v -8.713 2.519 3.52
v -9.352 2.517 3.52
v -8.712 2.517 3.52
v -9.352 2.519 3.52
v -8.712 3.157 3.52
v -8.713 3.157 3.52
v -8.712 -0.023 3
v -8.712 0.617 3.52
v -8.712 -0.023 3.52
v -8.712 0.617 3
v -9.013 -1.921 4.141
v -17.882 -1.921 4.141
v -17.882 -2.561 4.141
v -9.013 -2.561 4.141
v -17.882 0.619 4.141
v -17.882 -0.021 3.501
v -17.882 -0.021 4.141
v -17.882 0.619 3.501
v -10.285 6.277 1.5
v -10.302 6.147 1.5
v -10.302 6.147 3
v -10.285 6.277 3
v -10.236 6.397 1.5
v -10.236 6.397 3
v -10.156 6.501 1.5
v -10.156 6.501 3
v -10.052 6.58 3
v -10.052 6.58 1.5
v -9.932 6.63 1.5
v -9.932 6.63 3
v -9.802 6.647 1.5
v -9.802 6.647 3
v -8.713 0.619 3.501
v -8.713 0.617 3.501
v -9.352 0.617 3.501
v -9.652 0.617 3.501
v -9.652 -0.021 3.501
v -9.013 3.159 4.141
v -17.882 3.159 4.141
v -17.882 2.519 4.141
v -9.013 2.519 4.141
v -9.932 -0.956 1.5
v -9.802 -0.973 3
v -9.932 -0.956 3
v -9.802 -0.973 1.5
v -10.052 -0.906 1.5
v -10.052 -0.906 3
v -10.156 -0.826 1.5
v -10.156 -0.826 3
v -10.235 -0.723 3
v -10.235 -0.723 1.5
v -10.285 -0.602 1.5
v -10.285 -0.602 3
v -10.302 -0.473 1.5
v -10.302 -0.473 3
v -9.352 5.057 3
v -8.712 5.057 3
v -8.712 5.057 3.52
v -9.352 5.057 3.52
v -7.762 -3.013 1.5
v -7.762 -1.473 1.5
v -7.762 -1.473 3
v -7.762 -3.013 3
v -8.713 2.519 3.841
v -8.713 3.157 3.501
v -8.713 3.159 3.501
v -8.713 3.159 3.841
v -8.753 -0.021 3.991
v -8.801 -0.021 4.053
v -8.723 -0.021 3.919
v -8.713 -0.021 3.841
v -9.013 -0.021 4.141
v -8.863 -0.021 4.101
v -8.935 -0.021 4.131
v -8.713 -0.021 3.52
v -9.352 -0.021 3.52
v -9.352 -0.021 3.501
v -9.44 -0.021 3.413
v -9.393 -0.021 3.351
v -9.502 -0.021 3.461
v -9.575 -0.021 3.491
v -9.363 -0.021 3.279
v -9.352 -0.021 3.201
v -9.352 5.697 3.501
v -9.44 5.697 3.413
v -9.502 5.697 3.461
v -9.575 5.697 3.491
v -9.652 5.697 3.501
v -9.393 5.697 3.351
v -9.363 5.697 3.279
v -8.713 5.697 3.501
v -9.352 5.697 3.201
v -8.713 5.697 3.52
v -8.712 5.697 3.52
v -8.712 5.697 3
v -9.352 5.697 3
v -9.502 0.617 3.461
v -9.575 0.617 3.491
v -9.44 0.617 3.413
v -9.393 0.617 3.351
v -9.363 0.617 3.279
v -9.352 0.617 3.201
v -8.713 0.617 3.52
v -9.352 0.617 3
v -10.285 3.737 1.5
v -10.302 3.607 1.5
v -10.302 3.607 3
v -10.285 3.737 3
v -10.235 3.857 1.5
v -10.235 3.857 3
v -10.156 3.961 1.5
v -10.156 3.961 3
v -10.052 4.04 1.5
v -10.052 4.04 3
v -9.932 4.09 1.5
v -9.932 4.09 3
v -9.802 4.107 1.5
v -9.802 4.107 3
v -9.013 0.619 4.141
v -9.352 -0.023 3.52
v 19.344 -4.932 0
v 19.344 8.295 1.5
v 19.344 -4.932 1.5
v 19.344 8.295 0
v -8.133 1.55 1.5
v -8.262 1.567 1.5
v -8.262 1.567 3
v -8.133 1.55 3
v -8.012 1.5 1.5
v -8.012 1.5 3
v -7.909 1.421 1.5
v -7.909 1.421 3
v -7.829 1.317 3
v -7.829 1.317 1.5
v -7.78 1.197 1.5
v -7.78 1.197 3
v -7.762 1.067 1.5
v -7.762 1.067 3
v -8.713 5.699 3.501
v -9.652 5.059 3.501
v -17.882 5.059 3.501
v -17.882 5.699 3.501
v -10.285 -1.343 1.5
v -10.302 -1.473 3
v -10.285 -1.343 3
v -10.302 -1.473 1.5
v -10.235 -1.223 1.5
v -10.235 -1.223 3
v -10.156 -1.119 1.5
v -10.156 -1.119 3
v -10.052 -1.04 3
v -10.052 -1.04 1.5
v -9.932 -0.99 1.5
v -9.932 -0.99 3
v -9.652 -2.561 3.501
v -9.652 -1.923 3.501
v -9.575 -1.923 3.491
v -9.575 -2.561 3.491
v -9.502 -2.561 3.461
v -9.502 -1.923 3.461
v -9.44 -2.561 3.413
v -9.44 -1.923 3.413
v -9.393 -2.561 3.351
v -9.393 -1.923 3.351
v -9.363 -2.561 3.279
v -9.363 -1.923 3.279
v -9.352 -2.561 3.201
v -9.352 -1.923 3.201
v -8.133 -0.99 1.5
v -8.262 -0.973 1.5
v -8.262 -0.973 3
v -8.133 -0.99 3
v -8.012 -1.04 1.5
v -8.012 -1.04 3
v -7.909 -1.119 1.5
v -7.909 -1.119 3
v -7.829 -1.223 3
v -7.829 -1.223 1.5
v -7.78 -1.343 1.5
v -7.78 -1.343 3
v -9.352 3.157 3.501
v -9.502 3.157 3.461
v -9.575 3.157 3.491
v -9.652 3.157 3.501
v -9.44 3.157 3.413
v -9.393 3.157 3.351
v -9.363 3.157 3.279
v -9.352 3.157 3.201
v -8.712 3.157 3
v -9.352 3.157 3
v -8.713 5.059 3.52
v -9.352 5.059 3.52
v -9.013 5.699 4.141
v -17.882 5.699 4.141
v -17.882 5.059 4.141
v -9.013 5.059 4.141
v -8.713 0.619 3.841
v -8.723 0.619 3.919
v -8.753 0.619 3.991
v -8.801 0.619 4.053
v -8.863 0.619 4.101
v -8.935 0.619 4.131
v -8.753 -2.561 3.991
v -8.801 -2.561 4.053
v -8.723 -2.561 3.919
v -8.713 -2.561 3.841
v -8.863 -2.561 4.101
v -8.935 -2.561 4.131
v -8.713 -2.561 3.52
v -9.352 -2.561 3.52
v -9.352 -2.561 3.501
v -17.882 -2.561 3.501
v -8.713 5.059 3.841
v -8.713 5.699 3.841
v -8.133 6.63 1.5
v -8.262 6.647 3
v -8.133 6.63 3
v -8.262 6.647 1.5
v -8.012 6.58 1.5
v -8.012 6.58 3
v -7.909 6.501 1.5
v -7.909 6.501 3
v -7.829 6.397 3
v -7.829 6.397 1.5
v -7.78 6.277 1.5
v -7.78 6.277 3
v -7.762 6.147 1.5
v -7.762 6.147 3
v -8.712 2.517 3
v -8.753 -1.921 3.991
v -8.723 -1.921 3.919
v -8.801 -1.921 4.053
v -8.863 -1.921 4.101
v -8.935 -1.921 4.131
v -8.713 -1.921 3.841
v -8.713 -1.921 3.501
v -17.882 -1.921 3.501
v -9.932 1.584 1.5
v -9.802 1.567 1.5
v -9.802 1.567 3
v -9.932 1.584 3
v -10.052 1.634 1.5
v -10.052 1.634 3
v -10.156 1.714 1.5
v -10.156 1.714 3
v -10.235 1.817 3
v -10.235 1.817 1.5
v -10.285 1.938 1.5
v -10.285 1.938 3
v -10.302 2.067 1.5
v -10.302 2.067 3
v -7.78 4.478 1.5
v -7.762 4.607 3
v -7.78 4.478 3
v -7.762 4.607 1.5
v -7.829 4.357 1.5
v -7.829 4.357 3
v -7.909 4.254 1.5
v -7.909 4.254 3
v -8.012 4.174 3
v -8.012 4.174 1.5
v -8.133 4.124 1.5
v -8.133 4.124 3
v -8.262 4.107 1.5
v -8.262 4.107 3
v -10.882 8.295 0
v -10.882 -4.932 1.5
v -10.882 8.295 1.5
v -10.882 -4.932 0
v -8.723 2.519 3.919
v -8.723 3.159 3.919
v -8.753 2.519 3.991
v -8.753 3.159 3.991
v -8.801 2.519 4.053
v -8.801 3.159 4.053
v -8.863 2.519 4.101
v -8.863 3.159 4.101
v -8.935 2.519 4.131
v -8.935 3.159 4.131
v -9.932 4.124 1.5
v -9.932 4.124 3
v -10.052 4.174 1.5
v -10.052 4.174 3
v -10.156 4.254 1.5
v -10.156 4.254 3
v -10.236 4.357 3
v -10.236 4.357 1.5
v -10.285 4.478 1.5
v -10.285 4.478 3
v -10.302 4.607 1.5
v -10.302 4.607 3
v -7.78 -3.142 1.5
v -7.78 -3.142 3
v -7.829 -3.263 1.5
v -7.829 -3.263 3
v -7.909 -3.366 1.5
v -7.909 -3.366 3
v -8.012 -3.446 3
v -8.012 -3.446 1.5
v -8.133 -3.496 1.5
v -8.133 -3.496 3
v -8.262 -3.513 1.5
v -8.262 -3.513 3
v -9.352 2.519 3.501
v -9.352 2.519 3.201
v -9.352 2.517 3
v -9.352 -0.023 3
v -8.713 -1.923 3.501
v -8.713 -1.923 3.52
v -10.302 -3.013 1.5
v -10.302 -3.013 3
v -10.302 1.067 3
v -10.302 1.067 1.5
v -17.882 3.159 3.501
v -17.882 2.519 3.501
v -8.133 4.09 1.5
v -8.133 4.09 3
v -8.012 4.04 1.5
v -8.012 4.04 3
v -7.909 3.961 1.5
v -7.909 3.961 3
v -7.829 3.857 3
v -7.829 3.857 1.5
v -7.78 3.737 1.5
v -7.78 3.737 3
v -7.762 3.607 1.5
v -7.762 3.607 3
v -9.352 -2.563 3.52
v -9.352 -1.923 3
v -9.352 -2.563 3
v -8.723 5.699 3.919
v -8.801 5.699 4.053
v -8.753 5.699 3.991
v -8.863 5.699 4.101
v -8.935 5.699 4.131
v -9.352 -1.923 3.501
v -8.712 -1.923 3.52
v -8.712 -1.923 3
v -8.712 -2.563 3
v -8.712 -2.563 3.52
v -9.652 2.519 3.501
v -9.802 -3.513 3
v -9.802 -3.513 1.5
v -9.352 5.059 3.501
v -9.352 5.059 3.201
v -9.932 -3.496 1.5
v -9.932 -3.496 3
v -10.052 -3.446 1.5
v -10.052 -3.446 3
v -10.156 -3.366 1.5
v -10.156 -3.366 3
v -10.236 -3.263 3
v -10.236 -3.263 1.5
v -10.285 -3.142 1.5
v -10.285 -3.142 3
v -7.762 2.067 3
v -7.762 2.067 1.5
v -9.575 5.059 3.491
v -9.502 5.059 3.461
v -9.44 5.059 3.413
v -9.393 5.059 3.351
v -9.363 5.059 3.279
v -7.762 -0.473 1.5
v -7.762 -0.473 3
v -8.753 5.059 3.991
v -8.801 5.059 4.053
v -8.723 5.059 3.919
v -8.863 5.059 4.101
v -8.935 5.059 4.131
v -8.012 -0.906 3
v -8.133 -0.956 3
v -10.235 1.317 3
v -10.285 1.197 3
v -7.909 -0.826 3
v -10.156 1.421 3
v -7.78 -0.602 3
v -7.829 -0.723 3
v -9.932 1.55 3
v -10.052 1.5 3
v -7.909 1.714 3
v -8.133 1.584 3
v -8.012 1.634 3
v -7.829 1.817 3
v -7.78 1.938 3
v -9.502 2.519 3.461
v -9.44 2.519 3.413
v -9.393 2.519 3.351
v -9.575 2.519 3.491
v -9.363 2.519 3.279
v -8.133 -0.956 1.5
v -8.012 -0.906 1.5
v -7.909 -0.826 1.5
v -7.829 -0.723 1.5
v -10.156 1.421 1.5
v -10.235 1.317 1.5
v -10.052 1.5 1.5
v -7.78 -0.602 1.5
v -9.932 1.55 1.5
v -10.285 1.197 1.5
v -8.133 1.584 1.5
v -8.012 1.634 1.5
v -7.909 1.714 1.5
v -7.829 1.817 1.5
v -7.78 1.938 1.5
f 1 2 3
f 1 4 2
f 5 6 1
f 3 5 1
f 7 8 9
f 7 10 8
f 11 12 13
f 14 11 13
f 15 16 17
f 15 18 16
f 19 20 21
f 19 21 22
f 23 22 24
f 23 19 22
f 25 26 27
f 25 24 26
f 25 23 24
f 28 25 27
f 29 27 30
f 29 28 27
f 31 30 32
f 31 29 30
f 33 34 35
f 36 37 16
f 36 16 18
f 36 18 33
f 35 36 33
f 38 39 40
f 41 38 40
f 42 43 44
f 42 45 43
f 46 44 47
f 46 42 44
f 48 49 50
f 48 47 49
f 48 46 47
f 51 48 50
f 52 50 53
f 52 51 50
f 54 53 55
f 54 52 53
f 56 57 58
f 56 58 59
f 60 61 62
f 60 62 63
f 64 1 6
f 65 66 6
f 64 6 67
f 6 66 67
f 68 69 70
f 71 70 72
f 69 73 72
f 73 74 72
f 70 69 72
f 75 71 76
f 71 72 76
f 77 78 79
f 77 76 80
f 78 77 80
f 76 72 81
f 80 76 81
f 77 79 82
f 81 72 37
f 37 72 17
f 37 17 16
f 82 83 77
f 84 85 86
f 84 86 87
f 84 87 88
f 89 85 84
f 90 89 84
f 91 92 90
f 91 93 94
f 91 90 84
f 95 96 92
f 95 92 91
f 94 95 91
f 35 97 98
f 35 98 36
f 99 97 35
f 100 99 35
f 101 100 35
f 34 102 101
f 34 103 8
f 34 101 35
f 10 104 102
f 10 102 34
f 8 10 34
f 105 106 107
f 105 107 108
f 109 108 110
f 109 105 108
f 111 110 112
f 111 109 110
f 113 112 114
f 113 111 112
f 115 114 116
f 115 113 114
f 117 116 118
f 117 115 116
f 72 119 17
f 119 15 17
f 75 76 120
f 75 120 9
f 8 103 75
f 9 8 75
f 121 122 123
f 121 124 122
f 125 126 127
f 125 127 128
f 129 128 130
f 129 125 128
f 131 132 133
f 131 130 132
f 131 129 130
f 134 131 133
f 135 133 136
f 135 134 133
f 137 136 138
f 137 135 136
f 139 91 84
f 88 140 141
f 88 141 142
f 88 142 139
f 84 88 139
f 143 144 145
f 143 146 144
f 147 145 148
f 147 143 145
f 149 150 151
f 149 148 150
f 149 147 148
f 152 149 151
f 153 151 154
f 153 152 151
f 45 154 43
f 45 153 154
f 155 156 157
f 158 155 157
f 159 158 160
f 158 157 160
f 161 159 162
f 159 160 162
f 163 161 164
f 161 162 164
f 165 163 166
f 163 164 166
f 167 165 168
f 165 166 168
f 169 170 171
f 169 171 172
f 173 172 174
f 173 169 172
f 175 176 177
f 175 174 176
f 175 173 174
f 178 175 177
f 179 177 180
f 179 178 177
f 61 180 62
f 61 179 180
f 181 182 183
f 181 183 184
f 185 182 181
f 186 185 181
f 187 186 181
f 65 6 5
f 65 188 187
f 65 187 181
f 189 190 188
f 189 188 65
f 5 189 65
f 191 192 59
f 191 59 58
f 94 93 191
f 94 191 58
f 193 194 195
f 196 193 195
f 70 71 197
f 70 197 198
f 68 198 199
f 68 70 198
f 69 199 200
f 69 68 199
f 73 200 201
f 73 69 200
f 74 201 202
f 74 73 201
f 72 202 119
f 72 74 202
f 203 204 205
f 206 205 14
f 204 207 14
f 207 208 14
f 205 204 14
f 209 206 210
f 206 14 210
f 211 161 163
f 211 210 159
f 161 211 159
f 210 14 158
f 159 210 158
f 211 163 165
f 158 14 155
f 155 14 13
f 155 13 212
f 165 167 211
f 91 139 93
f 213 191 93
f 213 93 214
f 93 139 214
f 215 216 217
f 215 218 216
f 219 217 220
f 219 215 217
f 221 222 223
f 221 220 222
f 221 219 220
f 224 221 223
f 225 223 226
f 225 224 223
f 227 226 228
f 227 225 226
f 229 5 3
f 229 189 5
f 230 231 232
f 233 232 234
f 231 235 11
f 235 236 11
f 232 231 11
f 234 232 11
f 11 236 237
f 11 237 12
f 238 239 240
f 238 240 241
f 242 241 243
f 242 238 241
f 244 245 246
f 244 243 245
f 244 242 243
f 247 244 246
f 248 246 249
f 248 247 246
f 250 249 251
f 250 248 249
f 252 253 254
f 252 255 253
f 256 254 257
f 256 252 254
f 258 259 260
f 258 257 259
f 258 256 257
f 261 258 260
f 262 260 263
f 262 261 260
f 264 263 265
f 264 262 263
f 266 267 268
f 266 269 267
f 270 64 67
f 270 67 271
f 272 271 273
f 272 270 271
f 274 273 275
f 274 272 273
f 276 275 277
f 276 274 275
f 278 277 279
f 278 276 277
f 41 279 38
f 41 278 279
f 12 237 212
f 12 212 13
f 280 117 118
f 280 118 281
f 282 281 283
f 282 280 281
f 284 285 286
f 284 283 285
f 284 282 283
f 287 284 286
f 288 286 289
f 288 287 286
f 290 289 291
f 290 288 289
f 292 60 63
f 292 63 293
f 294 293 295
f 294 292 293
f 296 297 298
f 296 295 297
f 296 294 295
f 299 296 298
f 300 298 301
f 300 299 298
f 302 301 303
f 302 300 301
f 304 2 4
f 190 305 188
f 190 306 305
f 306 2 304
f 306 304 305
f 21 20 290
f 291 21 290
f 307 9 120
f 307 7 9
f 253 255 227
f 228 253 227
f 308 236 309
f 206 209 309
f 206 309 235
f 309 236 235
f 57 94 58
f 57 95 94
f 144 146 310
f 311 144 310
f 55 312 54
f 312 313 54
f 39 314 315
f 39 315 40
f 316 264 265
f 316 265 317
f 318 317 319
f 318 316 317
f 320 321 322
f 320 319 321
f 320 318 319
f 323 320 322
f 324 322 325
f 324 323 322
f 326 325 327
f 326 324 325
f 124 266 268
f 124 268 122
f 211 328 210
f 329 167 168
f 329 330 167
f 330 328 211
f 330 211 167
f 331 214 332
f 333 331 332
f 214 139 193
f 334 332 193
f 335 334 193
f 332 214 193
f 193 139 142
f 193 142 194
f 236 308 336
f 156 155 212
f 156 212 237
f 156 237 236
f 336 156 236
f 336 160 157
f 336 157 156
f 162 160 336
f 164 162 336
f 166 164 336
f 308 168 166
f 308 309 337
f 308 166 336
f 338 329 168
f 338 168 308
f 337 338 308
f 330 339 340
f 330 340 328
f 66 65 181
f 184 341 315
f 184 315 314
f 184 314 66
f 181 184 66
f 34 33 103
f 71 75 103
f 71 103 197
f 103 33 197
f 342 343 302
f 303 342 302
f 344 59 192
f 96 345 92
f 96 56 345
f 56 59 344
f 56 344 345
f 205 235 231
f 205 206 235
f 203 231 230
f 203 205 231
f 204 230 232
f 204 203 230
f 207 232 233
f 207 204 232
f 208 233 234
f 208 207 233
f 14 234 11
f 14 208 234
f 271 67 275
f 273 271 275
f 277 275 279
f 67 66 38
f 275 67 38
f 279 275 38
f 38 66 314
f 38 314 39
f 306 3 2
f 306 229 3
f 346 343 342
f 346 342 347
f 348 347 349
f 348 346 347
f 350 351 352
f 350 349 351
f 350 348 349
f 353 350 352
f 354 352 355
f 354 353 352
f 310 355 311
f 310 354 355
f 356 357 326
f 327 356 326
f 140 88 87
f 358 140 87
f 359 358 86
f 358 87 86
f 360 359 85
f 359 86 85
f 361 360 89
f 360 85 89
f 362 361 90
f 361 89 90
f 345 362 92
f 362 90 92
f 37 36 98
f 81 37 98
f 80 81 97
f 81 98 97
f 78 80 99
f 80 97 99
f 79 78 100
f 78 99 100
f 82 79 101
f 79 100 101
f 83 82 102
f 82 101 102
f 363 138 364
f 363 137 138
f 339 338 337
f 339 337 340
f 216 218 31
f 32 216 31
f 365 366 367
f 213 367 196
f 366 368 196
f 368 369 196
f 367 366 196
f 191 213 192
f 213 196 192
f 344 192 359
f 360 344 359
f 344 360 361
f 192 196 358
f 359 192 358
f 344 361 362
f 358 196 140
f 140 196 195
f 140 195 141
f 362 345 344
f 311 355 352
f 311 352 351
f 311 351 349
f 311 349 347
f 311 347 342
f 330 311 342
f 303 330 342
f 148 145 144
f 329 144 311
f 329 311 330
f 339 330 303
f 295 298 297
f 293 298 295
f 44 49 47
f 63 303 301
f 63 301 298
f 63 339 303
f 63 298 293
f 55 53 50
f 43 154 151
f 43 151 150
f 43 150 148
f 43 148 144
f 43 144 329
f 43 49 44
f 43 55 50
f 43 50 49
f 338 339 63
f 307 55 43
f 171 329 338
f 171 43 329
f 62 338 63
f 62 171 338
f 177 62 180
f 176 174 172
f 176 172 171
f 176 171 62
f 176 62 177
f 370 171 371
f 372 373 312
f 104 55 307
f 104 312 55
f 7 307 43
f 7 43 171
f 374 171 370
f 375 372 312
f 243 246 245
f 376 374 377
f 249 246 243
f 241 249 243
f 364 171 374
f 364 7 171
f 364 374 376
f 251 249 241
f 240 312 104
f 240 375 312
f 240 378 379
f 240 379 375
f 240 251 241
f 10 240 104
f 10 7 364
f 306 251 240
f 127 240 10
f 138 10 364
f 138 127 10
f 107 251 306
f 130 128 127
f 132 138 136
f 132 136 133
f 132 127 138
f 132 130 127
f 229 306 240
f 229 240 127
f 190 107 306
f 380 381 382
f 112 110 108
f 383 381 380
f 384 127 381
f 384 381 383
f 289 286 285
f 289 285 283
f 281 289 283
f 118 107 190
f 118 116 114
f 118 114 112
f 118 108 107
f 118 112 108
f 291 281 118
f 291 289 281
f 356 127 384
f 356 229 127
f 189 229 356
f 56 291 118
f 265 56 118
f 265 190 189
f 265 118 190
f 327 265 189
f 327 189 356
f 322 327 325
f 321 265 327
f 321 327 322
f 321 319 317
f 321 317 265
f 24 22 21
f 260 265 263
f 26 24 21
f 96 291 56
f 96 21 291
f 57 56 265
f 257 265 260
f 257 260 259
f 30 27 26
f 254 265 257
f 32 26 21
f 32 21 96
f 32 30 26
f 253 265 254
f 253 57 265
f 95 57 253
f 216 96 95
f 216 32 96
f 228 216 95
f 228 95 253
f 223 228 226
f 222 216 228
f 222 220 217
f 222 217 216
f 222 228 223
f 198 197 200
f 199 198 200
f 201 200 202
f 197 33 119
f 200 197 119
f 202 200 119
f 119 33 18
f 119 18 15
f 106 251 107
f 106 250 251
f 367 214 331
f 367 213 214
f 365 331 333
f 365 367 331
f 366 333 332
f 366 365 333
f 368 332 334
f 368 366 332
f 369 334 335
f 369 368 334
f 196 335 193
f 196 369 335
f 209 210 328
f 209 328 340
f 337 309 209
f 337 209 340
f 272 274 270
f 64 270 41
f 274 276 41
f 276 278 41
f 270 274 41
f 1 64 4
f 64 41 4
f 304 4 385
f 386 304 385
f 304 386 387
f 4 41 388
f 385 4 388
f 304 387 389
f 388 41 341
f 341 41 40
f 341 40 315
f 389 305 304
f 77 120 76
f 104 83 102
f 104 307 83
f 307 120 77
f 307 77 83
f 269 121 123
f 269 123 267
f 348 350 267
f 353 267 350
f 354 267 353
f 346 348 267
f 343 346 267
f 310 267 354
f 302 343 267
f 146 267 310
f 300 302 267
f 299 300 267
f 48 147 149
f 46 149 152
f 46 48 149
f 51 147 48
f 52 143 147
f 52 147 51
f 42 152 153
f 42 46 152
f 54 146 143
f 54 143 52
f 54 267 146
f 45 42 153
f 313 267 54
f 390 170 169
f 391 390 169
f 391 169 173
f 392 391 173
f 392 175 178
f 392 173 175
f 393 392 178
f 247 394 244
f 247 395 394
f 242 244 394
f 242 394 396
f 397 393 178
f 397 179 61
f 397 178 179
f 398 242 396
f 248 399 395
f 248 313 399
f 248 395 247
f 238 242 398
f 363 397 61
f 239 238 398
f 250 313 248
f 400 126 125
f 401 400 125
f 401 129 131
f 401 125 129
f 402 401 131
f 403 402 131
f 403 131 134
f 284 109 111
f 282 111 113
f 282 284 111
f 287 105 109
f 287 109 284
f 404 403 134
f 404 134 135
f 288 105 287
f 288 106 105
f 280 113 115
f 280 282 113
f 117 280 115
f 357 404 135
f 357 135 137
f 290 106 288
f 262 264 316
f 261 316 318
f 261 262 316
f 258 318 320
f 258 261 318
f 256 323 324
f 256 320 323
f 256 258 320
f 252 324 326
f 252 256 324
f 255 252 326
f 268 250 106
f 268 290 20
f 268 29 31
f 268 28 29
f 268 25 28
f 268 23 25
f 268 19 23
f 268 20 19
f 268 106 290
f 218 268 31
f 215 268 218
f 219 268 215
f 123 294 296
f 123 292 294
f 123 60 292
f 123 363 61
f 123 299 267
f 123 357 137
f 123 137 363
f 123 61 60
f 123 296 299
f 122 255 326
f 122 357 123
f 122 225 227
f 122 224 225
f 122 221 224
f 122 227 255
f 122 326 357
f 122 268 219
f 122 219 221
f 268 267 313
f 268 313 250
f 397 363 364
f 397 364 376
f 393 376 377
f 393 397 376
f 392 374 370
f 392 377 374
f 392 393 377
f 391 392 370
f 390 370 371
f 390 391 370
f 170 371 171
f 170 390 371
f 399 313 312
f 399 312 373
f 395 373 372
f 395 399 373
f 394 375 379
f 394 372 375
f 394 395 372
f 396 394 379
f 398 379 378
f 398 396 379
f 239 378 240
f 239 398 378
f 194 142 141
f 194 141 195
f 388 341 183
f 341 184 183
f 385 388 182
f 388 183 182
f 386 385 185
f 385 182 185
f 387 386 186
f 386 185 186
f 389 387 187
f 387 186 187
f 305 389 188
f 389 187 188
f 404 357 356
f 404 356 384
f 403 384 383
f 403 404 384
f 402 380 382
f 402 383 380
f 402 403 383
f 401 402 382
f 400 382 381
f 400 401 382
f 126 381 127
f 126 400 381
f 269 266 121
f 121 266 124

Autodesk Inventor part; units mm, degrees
ref_plane "YZ Plane" through (0, 0, 0) normal (1, 0, 0) x (0, 1, 0)
sketch "Sketch1" plane through (0, 0, 0) normal (0, 0, 1) x (1, 0, 0)
  line L0 (-10.8819, 8.2952) -> (19.3441, 8.2952)
  line L1 (19.3441, 8.2952) -> (19.3441, -4.9318)
  line L2 (19.3441, -4.9318) -> (-10.8819, -4.9318)
  line L3 (-10.8819, -4.9318) -> (-10.8819, 8.2952)
  point P0 (0, 0)
  dimension "d0" = 30.226
  dimension "d1" = 13.227
extrude "Extrusion1" add sketch "Sketch1" along normal blind 1.5
sketch "Sketch2" plane through (0, 0, 1.5) normal (0, 0, 1) x (1, 0, 0)
  line L0 (-7.7625, -1.4726) -> (-7.7625, -3.0126)
  line L1 (-9.8024, 1.5674) -> (-8.2625, 1.5674)
  line L2 (-8.7125, 2.5174) -> (-9.3525, 2.5174)
  line L3 (-9.3525, 3.1574) -> (-8.7125, 3.1574)
  line L4 (-9.3525, 2.5174) -> (-9.3525, 3.1574)
  line L5 (-8.7125, 3.1574) -> (-8.7125, 2.5174)
  line L6 (-9.3525, 2.5174) -> (-8.7125, 3.1574) construction
  line L7 (-9.3525, 3.1574) -> (-8.7125, 2.5174) construction
  line L8 (-9.3524, 5.0573) -> (-9.3524, 5.6973)
  line L9 (-9.3524, 5.0573) -> (-8.7124, 5.6973) construction
  line L10 (-8.2625, 6.6474) -> (-9.8025, 6.6474)
  line L11 (-8.7124, 5.0573) -> (-9.3524, 5.0573)
  line L12 (-9.3524, 5.6973) -> (-8.7124, 5.6973)
  line L13 (-8.7124, 5.6973) -> (-8.7124, 5.0573)
  line L14 (-9.3524, 5.6973) -> (-8.7124, 5.0573) construction
  line L15 (-9.8025, 4.1074) -> (-8.2625, 4.1074)
  line L16 (-9.8025, -3.5126) -> (-8.2625, -3.5126)
  line L17 (-9.8024, -0.9726) -> (-8.2625, -0.9726)
  line L18 (-9.3524, -1.9227) -> (-8.7124, -1.9227)
  line L19 (-8.7124, -1.9227) -> (-8.7124, -2.5627)
  line L20 (-8.7124, -2.5627) -> (-9.3524, -2.5627)
  line L21 (-9.3524, -2.5627) -> (-9.3524, -1.9227)
  line L22 (-9.3525, 0.6174) -> (-8.7125, 0.6174)
  line L23 (-8.7125, 0.6174) -> (-8.7125, -0.0226)
  line L24 (-8.7125, -0.0226) -> (-9.3525, -0.0226)
  line L25 (-9.3525, -0.0226) -> (-9.3525, 0.6174)
  line L26 (-9.3525, 0.6174) -> (-8.7125, -0.0226) construction
  line L27 (-9.3524, -1.9227) -> (-8.7124, -2.5627) construction
  line L28 (-9.3524, -2.5627) -> (-8.7124, -1.9227) construction
  line L29 (-9.3525, -0.0226) -> (-8.7125, 0.6174) construction
  line L30 (-10.3025, 6.1474) -> (-10.3025, 4.6074)
  line L31 (-7.7625, 4.6074) -> (-7.7625, 6.1474)
  arc A0 (-7.7625, 6.1474) -> (-8.2625, 6.6474) centre (-8.2625, 6.1474) ccw
  arc A1 (-9.8025, 6.6474) -> (-10.3025, 6.1474) centre (-9.8025, 6.1474) ccw
  arc A2 (-8.2625, -3.5126) -> (-7.7625, -3.0126) centre (-8.2625, -3.0126) ccw
  arc A3 (-10.3025, -3.0126) -> (-9.8025, -3.5126) centre (-9.8025, -3.0126) ccw
  arc A4 (-8.2625, 4.1074) -> (-7.7625, 4.6074) centre (-8.2625, 4.6074) ccw
  arc A5 (-10.3025, 4.6074) -> (-9.8025, 4.1074) centre (-9.8025, 4.6074) ccw
  arc A6 (-7.7625, -1.4726) -> (-8.2625, -0.9726) centre (-8.2625, -1.4726) ccw
  line L32 (-10.3024, 2.0674) -> (-10.3023, 3.6074)
  line L33 (-9.8023, 4.1074) -> (-9.8025, 4.1074)
  arc A7 (-9.8023, 4.1074) -> (-10.3023, 3.6074) centre (-9.8023, 3.6074) ccw
  arc A8 (-10.3024, 2.0674) -> (-9.8024, 1.5674) centre (-9.8024, 2.0674) ccw
  line L34 (-9.8024, 1.5674) -> (-9.8024, 1.5674)
  line L35 (-10.3024, 1.0674) -> (-10.3024, -0.4726)
  line L36 (-7.7625, 2.0674) -> (-7.7625, 3.6074)
  line L37 (-8.2625, 4.1074) -> (-8.2625, 4.1074)
  arc A9 (-7.7625, 3.6074) -> (-8.2625, 4.1074) centre (-8.2625, 3.6074) ccw
  arc A10 (-8.2625, 1.5674) -> (-7.7625, 2.0674) centre (-8.2625, 2.0674) ccw
  arc A11 (-9.8024, 1.5674) -> (-10.3024, 1.0674) centre (-9.8024, 1.0674) ccw
  arc A12 (-10.3024, -0.4726) -> (-9.8024, -0.9726) centre (-9.8024, -0.4726) ccw
  line L38 (-8.2625, 1.5674) -> (-8.2625, 1.5674)
  line L39 (-7.7625, 1.0674) -> (-7.7625, -0.4726)
  line L40 (-8.2625, -0.9726) -> (-8.2625, -0.9726)
  line L41 (-9.8024, -0.9726) -> (-9.8024, -0.9726)
  line L42 (-10.3024, -1.4726) -> (-10.3024, -3.0237)
  arc A13 (-9.8024, -0.9726) -> (-10.3024, -1.4726) centre (-9.8024, -1.4726) ccw
  arc A14 (-8.2625, -0.9726) -> (-7.7625, -0.4726) centre (-8.2625, -0.4726) ccw
  arc A15 (-7.7625, 1.0674) -> (-8.2625, 1.5674) centre (-8.2625, 1.0674) ccw
  line L43 (-8.2625, -0.9726) -> (-9.8024, -0.9726)
  line L44 (-8.2625, 1.5674) -> (-9.8024, 1.5674)
  line L45 (-8.2625, 4.1074) -> (-9.8024, 4.1074)
  line L46 (-9.8024, -0.9726) -> (-8.2625, -0.9726)
  line L47 (-8.2625, -0.9726) -> (-9.8024, -0.9726)
  line L48 (-7.7625, -1.4726) -> (-7.7625, -3.0126)
  line L49 (-8.2625, -3.5126) -> (-9.8025, -3.5126)
  line L50 (-10.3024, -3.0237) -> (-10.3024, -1.4726)
  point P0 (-7.7625, 6.6911)
  dimension "d30" = 0.64
  dimension "d31" = 0.64
  dimension "d32" = 0.64
  dimension "d33" = 0.64
  dimension "d34" = 0.64
  dimension "d35" = 0.64
  dimension "d36" = 0.64
  dimension "d37" = 0.64
  dimension "d38" = 1.9001
  dimension "d39" = 1.9
  dimension "d40" = 1.9
  dimension "d41" = 0.5
  dimension "d42" = 0.5
  dimension "d43" = 0.5
  dimension "d44" = 0.5
extrude "Extrusion2" add sketch "Sketch2" along normal blind 1.5 contours L17 A12 L35 A11 L1 A15 L39 A14 | L1 A8 L32 A7 L15 A9 L36 A10 | L15 A5 L30 A1 L10 A0 L31 A4 | L2 L4 L3 L5 | L8 L12 L13 L11 | L22 L23 L24 L25
extrude "Extrusion3" add sketch "Sketch2" along normal blind 1.5 contours L0 A2 L16 A3 L42 A13 L17 A6 | L18 L19 L20 L21
extrude "Extrusion4" add sketch "Sketch2" along normal blind 2.02 contours L2 L4 L3 L5 | L8 L12 L13 L11 | L18 L19 L20 L21 | L22 L23 L24 L25
ref_plane "Work Plane1" through (0, 0, 3.5) normal (0, 0, 1) x (1, 0, 0)
sketch "Sketch3" plane through (0, 0, 3.5) normal (0, 0, 1) x (1, 0, 0)
  line L0 (-8.7124, 5.0573) -> (-8.7124, 5.6973) projected
  line L1 (-8.7125, -0.0226) -> (-9.3525, -0.0226) projected
  line L2 (-9.3525, -0.0226) -> (-9.3525, 0.6174) projected
  line L3 (-9.3525, 0.6174) -> (-8.7125, 0.6174) projected
  line L4 (-8.7125, 0.6174) -> (-8.7125, -0.0226) projected
  line L5 (-9.3525, 3.1574) -> (-8.7125, 3.1574) projected
  line L6 (-8.7125, 3.1574) -> (-8.7125, 2.5174) projected
  line L7 (-8.7125, 2.5174) -> (-9.3525, 2.5174) projected
  line L8 (-9.3525, 2.5174) -> (-9.3525, 3.1574) projected
  line L9 (-8.7124, -1.9227) -> (-8.7124, -2.5627) projected
  line L10 (-8.7124, -2.5627) -> (-9.3524, -2.5627) projected
  line L11 (-9.3524, -2.5627) -> (-9.3524, -1.9227) projected
  line L12 (-9.3524, -1.9227) -> (-8.7124, -1.9227) projected
  line L13 (-9.3524, 5.6973) -> (-8.7124, 5.6973) projected
  line L14 (-8.7124, 5.6973) -> (-8.7124, 5.0573) projected
  line L15 (-8.7124, 5.0573) -> (-9.3524, 5.0573) projected
  line L16 (-9.3524, 5.0573) -> (-9.3524, 5.6973) projected
  arc A0 (-9.8024, 1.5674) -> (-10.3024, 1.0674) centre (-9.8024, 1.0674) ccw construction
  line L17 (-10.3024, 1.0674) -> (-10.3024, -0.4726) construction
  arc A1 (-10.3024, -0.4726) -> (-9.8024, -0.9726) centre (-9.8024, -0.4726) ccw construction
  arc A2 (-9.8024, -0.9726) -> (-10.3024, -1.4726) centre (-9.8024, -1.4726) ccw construction
  line L18 (-10.3024, -1.4726) -> (-10.3024, -3.0237) construction
  arc A3 (-10.3024, -3.0237) -> (-9.8025, -3.5126) centre (-9.8025, -3.0126) ccw construction
  line L19 (-9.8025, -3.5126) -> (-8.2625, -3.5126) construction
  arc A4 (-8.2625, -3.5126) -> (-7.7625, -3.0126) centre (-8.2625, -3.0126) ccw construction
  line L20 (-7.7625, -3.0126) -> (-7.7625, -1.4726) construction
  arc A5 (-7.7625, -1.4726) -> (-8.2625, -0.9726) centre (-8.2625, -1.4726) ccw construction
  arc A6 (-8.2625, -0.9726) -> (-7.7625, -0.4726) centre (-8.2625, -0.4726) ccw construction
  line L21 (-7.7625, -0.4726) -> (-7.7625, 1.0674) construction
  arc A7 (-7.7625, 1.0674) -> (-8.2625, 1.5674) centre (-8.2625, 1.0674) ccw construction
  arc A8 (-8.2625, 1.5674) -> (-7.7625, 2.0674) centre (-8.2625, 2.0674) ccw construction
  line L22 (-7.7625, 2.0674) -> (-7.7625, 3.6074) construction
  arc A9 (-7.7625, 3.6074) -> (-8.2625, 4.1074) centre (-8.2625, 3.6074) ccw construction
  arc A10 (-8.2625, 4.1074) -> (-7.7625, 4.6074) centre (-8.2625, 4.6074) ccw construction
  line L23 (-7.7625, 4.6074) -> (-7.7625, 6.1474) construction
  arc A11 (-7.7625, 6.1474) -> (-8.2625, 6.6474) centre (-8.2625, 6.1474) ccw construction
  line L24 (-8.2625, 6.6474) -> (-9.8025, 6.6474) construction
  arc A12 (-9.8025, 6.6474) -> (-10.3025, 6.1474) centre (-9.8025, 6.1474) ccw construction
  line L25 (-10.3025, 6.1474) -> (-10.3025, 4.6074) construction
  arc A13 (-10.3025, 4.6074) -> (-9.8024, 4.1074) centre (-9.8025, 4.6074) ccw construction
  arc A14 (-9.8024, 4.1074) -> (-10.3023, 3.6074) centre (-9.8023, 3.6074) ccw construction
  line L26 (-10.3023, 3.6074) -> (-10.3024, 2.0674) construction
  arc A15 (-10.3024, 2.0674) -> (-9.8024, 1.5674) centre (-9.8024, 2.0674) ccw construction
  line L27 (19.3441, 8.2952) -> (-10.8819, 8.2952) construction
  line L28 (-10.8819, 8.2952) -> (-10.8819, -4.9318) construction
  line L29 (-10.8819, -4.9318) -> (19.3441, -4.9318) construction
  line L30 (19.3441, -4.9318) -> (19.3441, 8.2952) construction
  arc A16 (-7.7625, -1.4726) -> (-8.2625, -0.9726) centre (-8.2625, -1.4726) ccw construction
  line L31 (-7.7625, -1.4726) -> (-7.7625, -3.0126) construction
  arc A17 (-8.2625, -3.5126) -> (-7.7625, -3.0126) centre (-8.2625, -3.0126) ccw construction
  line L32 (-8.2625, -3.5126) -> (-9.8025, -3.5126) construction
  arc A18 (-10.3024, -3.0237) -> (-9.8025, -3.5126) centre (-9.8025, -3.0126) ccw construction
  line L33 (-10.3024, -3.0237) -> (-10.3024, -1.4726) construction
  arc A19 (-9.8024, -0.9726) -> (-10.3024, -1.4726) centre (-9.8024, -1.4726) ccw construction
  arc A20 (-10.3024, -0.4726) -> (-9.8024, -0.9726) centre (-9.8024, -0.4726) ccw construction
  line L34 (-10.3024, -0.4726) -> (-10.3024, 1.0674) construction
  arc A21 (-9.8024, 1.5674) -> (-10.3024, 1.0674) centre (-9.8024, 1.0674) ccw construction
  arc A22 (-10.3024, 2.0674) -> (-9.8024, 1.5674) centre (-9.8024, 2.0674) ccw construction
  line L35 (-10.3024, 2.0674) -> (-10.3023, 3.6074) construction
  arc A23 (-9.8024, 4.1074) -> (-10.3023, 3.6074) centre (-9.8023, 3.6074) ccw construction
  arc A24 (-10.3025, 4.6074) -> (-9.8024, 4.1074) centre (-9.8025, 4.6074) ccw construction
  line L36 (-10.3025, 4.6074) -> (-10.3025, 6.1474) construction
  arc A25 (-9.8025, 6.6474) -> (-10.3025, 6.1474) centre (-9.8025, 6.1474) ccw construction
  line L37 (-9.8025, 6.6474) -> (-8.2625, 6.6474) construction
  arc A26 (-7.7625, 6.1474) -> (-8.2625, 6.6474) centre (-8.2625, 6.1474) ccw construction
  line L38 (-7.7625, 6.1474) -> (-7.7625, 4.6074) construction
  arc A27 (-8.2625, 4.1074) -> (-7.7625, 4.6074) centre (-8.2625, 4.6074) ccw construction
  arc A28 (-7.7625, 3.6074) -> (-8.2625, 4.1074) centre (-8.2625, 3.6074) ccw construction
  line L39 (-7.7625, 3.6074) -> (-7.7625, 2.0674) construction
  arc A29 (-8.2625, 1.5674) -> (-7.7625, 2.0674) centre (-8.2625, 2.0674) ccw construction
  arc A30 (-7.7625, 1.0674) -> (-8.2625, 1.5674) centre (-8.2625, 1.0674) ccw construction
  line L40 (-7.7625, 1.0674) -> (-7.7625, -0.4726) construction
  arc A31 (-8.2625, -0.9726) -> (-7.7625, -0.4726) centre (-8.2625, -0.4726) ccw construction
  point P0 (0, 0)
ref_plane "Work Plane2" through (-17.8819, -4.9318, 0) normal (-1, 0, 0) x (0, 0, 1)
sketch "Sketch4" plane through (-17.8819, -4.9318, 0) normal (-1, 0, 0) x (0, 0, 1)
  line L0 (3.5011, 3.0104) -> (4.1411, 3.0104)
  line L1 (3.5011, 3.0104) -> (4.1411, 2.3704) construction
  line L2 (4.1411, 3.0104) -> (4.1411, 2.3704)
  line L3 (4.1411, 2.3704) -> (3.5011, 2.3704)
  line L4 (3.5011, 2.3704) -> (3.5011, 3.0104)
  line L5 (3.5011, 2.3704) -> (4.1411, 3.0104) construction
  line L6 (4.1411, 7.4505) -> (3.5011, 7.4505)
  line L7 (3.5011, 8.0905) -> (4.1411, 8.0905)
  line L8 (4.1411, 8.0905) -> (4.1411, 7.4505)
  line L9 (3.5011, 7.4505) -> (4.1411, 8.0905) construction
  line L10 (3.5011, 8.0905) -> (4.1411, 7.4505) construction
  line L11 (3.5011, 7.4505) -> (3.5011, 8.0905)
  line L12 (3.5012, 9.9904) -> (3.5012, 10.6304)
  line L13 (3.5012, 9.9904) -> (4.1412, 10.6304) construction
  line L14 (4.1412, 9.9904) -> (3.5012, 9.9904)
  line L15 (4.1412, 10.6304) -> (4.1412, 9.9904)
  line L16 (3.5012, 10.6304) -> (4.1412, 9.9904) construction
  line L17 (3.5012, 10.6304) -> (4.1412, 10.6304)
  line L18 (4.1411, 4.9105) -> (3.5011, 4.9105)
  line L19 (3.5011, 5.5505) -> (4.1411, 5.5505)
  line L20 (4.1411, 5.5505) -> (4.1411, 4.9105)
  line L21 (3.5011, 4.9105) -> (3.5011, 5.5505)
  line L22 (3.5011, 5.5505) -> (4.1411, 4.9105) construction
  line L23 (3.5011, 4.9105) -> (4.1411, 5.5505) construction
  line L24 (2.4101, 9.0392) -> (2.41, 9.0392)
  line L25 (2.4101, 6.4992) -> (2.4101, 6.4992)
  line L26 (2.4101, 3.9592) -> (2.4101, 3.9592)
  point P0 (0, 4.9318)
  point P1 (2.2355, 10.9967)
  point P2 (2.2355, 1.8367)
  point P3 (2.2355, 9.4567)
  point P4 (2.2356, 8.4567)
  point P5 (2.2356, 6.9167)
  point P6 (2.2356, 5.9167)
  point P7 (2.2356, 3.8767)
  point P8 (2.2356, 4.3767)
  point P9 (2.2356, 3.3767)
  point P10 (2.2356, 3.8767)
  point P11 (2.2356, 8.9567)
  dimension "d53" = 0.64
  dimension "d54" = 0.64
  dimension "d55" = 0.64
  dimension "d56" = 0.64
  dimension "d57" = 0.64
  dimension "d58" = 0.64
  dimension "d59" = 0.64
  dimension "d60" = 0.64
  dimension "d61" = 1.9001
  dimension "d62" = 1.9
  dimension "d63" = 1.9
ref_plane "Work Plane4" through (-17.8819, 3.1587, 3.8211) normal (0, 0, 1) x (1, 0, 0)
ref_plane "Work Plane5" through (-9.0325, 0.6174, 3.52) normal (1, 0, 0) x (0, 1, 0)
sketch "Sketch5" plane through (-17.8819, 3.1587, 3.8211) normal (0, 0, 1) x (1, 0, 0)
  line L0 (0, -5.0801) -> (0, -5.7201) projected
  line L1 (0, -2.54) -> (0, -3.18) projected
  line L2 (0, 0) -> (0, -0.64) projected
  line L3 (0, 2.5399) -> (0, 1.8999) projected
  point P0 (17.8819, -3.1587)
sketch "Sketch6" plane through (-9.0325, 0.6174, 3.52) normal (1, 0, 0) x (0, 1, 0)
  point P0 (-0.6174, -3.52)
sketch "Sketch7" plane through (-17.8819, 3.1587, 3.8211) normal (0, 0, 1) x (1, 0, 0)
  line L0 (8.5294, -5.7213) -> (8.5294, -5.0813) projected
  line L1 (8.5294, -3.1813) -> (8.5294, -2.5413) projected
  line L2 (8.5294, -0.6413) -> (8.5294, -0.0013) projected
  line L3 (8.5295, 1.8987) -> (8.5295, 2.5387) projected
  point P0 (17.8819, -3.1587)
sketch "Sketch8" plane through (-9.0325, 0.6174, 3.52) normal (1, 0, 0) x (0, 1, 0)
  line L0 (-3.1801, 0.3011) -> (-2.5401, 0.3011) projected
  line L1 (-0.64, 0.3011) -> (0, 0.3011) projected
  line L2 (1.9, 0.3011) -> (2.54, 0.3011) projected
  line L3 (4.44, 0.3011) -> (5.08, 0.3011) projected
  point P0 (-0.6174, -3.52)
sketch "Sketch9" plane through (-17.8819, 3.1587, 3.8211) normal (0, 0, 1) x (1, 0, 0)
  line L0 (0, -5.4007) -> (8.8472, -5.4007)
  line L1 (8.8472, -2.8613) -> (0, -2.8613)
  line L2 (8.8472, -0.3213) -> (0, -0.3213)
  line L3 (8.8472, 2.2187) -> (0, 2.2187)
  point P0 (17.8819, -3.1587)
sketch "Sketch10" plane through (-9.0325, 0.6174, 3.52) normal (1, 0, 0) x (0, 1, 0)
  line L0 (-0.32, 0.3312) -> (-0.32, 0)
  line L1 (0, 0) -> (-0.64, 0) projected
  line L2 (1.9, 0) -> (2.54, 0) projected
  line L3 (2.22, 0) -> (2.22, 0.3312)
  line L4 (4.44, 0) -> (5.08, 0) projected
  line L5 (4.76, 0) -> (4.76, 0.3312)
  point P0 (-0.6174, -3.52)
extrude "Extrusion5" add sketch "Sketch4" against normal blind 9.169
fillet "Fillet1" radius 0.3 1 edges at (-9.3524, 5.378, 3.5012)
fillet "Fillet2" radius 0.3 1 edges at (-9.3525, 2.838, 3.5011)
fillet "Fillet3" radius 0.3 1 edges at (-9.3525, 0.298, 3.5011)
fillet "Fillet4" radius 0.3 1 edges at (-9.3524, -2.2421, 3.5011)
fillet "Fillet5" radius 0.3 4 edges at (-8.7129, 5.3786, 4.1412) (-8.7129, 2.8387, 4.1411) (-8.7129, 0.2987, 4.1411) (-8.7129, -2.2414, 4.1411)
sketch "Sketch11" plane through (0, 0, 1.5) normal (0, 0, 1) x (1, 0, 0)
  line L0 (-10.8815, 8.2937) -> (19.2548, 8.2937) construction
  line L1 (19.2548, 8.2937) -> (19.2548, -4.9334) construction
  line L2 (19.2548, -4.9334) -> (-10.8815, -4.9334) construction
  line L3 (-10.8815, -4.9334) -> (-10.8815, 8.2937) construction
  point P0 (0, 0)
sketch "Sketch12" plane through (0, 0, 0) normal (0, 0, -1) x (-1, 0, 0)
  line L0 (10.8819, 8.2952) -> (-19.3441, 8.2952) projected
  line L1 (-19.3441, 8.2952) -> (10.8819, 8.2952) construction
  line L2 (10.8819, 8.2952) -> (10.8819, -4.5926) construction
  line L3 (10.8819, -4.5926) -> (-19.3441, -4.5926) construction
  line L4 (-19.3441, -4.5926) -> (-19.3441, 8.2952) construction
  point P0 (0, 0)
ref_plane "Work Plane3" through (-17.8819, 3.1587, 4.1411) normal (0, 0, 1) x (1, 0, 0)
properties part number "BLUTOOTH" material "Ogólne"
